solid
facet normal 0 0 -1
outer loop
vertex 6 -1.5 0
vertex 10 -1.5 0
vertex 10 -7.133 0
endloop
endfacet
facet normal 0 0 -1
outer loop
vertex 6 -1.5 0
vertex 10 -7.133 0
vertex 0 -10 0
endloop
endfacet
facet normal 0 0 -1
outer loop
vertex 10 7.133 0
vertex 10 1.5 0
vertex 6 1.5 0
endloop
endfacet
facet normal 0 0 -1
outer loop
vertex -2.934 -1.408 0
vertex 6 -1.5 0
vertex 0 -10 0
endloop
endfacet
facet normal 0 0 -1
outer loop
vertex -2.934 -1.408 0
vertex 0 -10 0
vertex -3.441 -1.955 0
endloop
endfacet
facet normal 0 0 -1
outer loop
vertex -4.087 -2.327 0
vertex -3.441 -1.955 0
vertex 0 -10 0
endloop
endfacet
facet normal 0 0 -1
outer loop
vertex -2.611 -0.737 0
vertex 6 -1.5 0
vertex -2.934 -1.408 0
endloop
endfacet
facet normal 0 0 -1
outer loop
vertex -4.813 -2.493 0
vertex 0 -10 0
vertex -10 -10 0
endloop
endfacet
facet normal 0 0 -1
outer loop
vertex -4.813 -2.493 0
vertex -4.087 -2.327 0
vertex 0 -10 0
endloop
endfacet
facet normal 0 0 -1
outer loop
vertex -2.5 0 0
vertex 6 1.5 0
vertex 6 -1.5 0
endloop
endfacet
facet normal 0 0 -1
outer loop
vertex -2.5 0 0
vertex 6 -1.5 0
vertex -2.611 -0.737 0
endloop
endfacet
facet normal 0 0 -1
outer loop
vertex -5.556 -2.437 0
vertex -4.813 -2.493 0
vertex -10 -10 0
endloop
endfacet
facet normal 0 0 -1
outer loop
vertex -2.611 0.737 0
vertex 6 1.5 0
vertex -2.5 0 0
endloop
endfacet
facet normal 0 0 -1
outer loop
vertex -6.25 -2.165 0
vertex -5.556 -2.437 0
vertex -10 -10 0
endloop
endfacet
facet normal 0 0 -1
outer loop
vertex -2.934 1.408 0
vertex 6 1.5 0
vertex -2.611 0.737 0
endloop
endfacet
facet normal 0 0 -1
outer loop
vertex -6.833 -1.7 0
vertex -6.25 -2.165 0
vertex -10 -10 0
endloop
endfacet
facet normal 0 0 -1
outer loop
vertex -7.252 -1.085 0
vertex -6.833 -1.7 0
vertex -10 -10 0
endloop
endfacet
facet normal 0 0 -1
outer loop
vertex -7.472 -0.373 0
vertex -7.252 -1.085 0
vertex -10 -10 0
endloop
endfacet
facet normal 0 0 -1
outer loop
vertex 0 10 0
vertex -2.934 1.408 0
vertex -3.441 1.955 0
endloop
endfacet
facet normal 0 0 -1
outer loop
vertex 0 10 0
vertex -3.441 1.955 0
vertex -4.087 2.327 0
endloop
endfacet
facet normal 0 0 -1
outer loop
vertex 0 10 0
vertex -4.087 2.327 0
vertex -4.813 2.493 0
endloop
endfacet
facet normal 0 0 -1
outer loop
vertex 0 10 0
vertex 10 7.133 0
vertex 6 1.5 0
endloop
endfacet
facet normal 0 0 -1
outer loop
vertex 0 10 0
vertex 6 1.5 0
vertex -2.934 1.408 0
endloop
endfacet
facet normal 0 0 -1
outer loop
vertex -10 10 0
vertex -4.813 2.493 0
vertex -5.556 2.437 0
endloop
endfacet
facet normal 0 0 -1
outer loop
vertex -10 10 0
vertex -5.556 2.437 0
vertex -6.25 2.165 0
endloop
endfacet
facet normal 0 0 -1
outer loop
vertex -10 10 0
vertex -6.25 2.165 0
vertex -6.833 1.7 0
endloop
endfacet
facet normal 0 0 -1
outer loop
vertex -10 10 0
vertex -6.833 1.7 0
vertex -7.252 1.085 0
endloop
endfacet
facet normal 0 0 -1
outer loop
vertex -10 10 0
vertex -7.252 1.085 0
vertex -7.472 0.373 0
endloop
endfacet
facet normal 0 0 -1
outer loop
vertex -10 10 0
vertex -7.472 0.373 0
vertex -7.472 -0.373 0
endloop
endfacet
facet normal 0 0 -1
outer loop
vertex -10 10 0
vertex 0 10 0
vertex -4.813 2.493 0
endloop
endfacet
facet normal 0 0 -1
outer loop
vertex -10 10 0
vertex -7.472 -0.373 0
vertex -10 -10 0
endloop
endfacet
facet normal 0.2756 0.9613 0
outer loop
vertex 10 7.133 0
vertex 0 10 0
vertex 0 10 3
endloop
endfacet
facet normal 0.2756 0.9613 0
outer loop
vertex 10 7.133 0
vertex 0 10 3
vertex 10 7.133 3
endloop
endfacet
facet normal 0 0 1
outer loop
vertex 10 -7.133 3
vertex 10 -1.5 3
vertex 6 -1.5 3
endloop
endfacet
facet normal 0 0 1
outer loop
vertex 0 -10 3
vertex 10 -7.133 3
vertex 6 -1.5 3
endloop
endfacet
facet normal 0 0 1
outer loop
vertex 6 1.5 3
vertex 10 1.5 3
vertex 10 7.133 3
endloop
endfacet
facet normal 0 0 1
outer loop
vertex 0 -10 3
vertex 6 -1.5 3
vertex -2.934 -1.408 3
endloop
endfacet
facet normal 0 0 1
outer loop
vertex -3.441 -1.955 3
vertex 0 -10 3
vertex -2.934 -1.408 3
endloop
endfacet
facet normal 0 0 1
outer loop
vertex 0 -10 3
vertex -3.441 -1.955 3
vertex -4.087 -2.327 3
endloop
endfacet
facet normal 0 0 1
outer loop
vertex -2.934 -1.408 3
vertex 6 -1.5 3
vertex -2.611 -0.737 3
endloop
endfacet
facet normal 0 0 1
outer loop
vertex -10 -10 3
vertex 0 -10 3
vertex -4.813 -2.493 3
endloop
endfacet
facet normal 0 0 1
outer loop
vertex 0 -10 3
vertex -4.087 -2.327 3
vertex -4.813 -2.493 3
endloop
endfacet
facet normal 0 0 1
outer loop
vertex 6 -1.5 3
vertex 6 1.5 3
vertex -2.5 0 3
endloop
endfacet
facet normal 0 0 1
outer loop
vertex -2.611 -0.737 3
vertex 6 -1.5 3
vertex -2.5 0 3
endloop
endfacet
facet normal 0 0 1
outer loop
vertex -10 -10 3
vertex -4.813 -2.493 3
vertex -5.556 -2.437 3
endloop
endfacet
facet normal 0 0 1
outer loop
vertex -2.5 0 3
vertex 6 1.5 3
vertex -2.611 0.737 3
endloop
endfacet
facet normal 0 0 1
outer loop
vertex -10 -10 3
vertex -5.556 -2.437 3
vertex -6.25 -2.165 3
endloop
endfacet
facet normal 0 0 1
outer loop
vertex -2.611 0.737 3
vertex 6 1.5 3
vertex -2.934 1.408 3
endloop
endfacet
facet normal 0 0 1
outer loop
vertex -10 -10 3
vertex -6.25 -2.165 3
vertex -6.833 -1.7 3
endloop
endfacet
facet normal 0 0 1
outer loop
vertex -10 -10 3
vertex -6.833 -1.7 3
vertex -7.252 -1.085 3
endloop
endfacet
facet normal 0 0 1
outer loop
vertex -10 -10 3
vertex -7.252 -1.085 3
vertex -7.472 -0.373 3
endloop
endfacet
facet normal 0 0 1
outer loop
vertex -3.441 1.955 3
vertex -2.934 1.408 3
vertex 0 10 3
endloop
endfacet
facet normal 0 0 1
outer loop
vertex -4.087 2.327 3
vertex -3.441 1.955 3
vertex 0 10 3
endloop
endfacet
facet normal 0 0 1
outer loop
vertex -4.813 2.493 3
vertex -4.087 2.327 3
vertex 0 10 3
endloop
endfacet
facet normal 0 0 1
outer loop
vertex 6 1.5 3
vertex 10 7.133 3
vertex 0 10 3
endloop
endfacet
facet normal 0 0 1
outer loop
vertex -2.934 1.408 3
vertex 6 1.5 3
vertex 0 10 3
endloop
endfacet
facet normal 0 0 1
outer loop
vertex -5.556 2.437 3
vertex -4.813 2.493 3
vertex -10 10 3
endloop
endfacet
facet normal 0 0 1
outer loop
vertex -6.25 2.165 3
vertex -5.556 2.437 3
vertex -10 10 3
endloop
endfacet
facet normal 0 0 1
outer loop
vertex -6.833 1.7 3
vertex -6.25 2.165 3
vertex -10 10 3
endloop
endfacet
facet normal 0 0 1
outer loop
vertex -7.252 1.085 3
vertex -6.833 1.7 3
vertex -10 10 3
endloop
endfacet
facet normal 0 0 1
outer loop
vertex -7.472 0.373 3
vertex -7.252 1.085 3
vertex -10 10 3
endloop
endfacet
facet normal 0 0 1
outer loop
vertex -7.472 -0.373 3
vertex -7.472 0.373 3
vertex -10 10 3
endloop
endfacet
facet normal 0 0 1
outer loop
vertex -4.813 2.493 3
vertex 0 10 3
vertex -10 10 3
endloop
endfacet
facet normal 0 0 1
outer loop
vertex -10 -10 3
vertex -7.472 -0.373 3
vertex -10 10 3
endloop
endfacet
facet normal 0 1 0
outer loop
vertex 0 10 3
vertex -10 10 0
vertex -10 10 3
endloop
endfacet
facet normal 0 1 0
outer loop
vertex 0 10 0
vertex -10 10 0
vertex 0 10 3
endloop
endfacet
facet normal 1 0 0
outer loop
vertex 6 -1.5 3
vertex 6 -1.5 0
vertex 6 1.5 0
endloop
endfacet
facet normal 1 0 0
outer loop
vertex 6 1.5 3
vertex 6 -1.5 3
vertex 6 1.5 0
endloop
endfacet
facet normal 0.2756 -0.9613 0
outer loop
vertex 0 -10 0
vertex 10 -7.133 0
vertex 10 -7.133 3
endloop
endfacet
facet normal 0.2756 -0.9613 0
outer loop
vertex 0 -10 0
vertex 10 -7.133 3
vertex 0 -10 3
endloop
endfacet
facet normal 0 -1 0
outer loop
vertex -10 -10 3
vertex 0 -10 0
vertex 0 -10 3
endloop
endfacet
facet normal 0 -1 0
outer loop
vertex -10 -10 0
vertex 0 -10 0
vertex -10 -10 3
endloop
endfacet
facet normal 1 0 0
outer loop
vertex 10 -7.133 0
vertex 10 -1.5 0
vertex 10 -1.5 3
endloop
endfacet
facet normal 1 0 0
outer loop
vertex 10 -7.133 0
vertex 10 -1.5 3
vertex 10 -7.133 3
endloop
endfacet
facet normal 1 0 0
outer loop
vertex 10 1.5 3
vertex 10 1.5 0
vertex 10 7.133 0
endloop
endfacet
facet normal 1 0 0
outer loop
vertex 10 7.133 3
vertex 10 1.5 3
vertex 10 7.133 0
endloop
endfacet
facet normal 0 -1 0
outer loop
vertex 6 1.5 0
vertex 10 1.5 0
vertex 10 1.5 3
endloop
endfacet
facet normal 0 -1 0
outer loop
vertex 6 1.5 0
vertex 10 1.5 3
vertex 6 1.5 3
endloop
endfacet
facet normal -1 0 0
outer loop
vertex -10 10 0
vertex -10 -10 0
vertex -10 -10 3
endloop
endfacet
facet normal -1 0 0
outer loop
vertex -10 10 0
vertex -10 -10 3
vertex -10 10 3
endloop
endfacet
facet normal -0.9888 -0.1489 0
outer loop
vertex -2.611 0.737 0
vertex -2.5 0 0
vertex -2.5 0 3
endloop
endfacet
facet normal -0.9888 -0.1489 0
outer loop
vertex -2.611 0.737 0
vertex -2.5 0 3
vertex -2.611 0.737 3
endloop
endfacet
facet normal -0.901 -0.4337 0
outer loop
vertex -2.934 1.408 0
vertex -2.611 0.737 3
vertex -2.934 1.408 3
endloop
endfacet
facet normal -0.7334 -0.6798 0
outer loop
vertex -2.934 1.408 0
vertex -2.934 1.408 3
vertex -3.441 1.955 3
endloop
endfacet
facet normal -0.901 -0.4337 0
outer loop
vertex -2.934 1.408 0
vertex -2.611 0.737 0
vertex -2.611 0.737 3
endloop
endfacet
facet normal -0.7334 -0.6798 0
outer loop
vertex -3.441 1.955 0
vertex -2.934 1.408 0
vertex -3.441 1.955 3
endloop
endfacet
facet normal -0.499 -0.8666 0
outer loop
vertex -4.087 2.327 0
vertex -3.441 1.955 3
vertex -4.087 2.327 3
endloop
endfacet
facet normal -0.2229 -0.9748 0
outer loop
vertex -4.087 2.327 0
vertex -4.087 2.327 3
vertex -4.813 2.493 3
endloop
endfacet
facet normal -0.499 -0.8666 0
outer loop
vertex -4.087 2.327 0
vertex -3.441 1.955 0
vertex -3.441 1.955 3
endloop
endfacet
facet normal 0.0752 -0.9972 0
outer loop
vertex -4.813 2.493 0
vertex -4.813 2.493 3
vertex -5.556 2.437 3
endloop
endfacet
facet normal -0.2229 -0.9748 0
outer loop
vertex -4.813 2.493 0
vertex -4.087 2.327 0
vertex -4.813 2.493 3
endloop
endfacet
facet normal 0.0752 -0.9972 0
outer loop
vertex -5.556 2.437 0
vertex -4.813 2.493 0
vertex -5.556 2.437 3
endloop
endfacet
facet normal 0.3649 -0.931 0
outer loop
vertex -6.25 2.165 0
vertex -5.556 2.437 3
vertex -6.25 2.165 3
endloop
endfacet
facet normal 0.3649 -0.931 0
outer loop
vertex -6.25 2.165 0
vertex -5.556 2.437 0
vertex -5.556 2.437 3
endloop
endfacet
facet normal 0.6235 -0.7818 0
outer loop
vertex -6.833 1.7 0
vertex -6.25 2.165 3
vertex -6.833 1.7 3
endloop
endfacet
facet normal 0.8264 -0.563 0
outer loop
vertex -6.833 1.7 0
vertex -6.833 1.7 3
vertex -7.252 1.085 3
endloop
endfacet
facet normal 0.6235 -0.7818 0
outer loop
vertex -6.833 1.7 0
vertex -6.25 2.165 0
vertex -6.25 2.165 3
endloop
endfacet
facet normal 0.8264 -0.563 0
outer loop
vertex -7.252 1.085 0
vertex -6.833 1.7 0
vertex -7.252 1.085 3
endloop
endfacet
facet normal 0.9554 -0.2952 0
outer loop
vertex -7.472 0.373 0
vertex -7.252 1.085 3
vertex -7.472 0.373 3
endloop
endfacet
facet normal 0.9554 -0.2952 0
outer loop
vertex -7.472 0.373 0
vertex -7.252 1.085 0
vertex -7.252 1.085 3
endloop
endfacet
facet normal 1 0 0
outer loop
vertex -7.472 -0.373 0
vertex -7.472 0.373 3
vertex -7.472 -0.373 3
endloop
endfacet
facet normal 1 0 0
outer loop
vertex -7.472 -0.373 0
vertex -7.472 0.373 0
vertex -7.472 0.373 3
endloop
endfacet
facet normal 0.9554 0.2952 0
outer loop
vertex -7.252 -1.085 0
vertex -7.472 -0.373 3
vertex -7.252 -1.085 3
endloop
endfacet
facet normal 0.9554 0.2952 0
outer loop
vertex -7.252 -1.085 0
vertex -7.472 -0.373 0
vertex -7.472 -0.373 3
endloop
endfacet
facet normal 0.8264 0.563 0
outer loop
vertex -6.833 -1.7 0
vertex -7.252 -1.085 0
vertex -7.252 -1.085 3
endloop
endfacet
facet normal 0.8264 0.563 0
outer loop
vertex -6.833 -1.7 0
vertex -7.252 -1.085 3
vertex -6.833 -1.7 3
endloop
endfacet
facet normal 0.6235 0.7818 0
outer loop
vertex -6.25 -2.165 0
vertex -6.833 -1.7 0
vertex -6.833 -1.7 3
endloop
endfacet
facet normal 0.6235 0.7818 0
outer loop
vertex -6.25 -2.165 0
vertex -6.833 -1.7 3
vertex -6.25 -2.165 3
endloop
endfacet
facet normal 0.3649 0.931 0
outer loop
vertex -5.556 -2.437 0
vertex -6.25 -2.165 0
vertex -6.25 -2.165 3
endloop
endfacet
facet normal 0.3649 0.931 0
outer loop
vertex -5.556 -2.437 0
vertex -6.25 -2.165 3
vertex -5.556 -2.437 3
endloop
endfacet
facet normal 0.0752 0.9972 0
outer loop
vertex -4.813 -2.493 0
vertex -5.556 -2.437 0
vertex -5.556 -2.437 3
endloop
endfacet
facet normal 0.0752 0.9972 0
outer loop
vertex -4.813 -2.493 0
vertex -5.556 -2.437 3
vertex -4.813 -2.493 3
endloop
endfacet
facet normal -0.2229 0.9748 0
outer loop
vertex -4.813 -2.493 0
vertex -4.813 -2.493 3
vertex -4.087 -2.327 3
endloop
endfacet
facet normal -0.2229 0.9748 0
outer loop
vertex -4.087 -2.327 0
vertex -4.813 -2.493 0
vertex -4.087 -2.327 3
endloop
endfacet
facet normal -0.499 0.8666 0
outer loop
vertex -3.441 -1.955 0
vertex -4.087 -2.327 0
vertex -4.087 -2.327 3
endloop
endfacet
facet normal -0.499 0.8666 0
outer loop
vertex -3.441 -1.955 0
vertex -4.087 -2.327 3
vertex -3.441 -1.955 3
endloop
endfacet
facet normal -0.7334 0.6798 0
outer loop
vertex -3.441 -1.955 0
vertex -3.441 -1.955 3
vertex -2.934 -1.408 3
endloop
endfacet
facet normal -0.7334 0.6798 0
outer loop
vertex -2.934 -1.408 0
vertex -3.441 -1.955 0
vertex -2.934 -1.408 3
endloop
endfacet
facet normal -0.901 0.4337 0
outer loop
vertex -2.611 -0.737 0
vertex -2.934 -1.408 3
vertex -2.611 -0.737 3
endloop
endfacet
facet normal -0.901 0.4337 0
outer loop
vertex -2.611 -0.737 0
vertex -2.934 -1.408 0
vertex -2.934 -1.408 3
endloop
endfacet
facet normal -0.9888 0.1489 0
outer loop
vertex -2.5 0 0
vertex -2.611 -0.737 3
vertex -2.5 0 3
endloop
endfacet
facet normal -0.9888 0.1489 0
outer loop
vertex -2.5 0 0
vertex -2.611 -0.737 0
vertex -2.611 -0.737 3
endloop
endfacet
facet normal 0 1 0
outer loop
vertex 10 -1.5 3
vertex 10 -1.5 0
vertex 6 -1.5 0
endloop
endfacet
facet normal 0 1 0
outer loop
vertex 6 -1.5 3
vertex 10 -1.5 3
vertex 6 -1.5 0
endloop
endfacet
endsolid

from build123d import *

# Parameters (mm, degrees)
SKETCH1_R           = 2.5
BOSS_EXTRUDE1_DEPTH = 3
SKETCH2_W           = 5
SKETCH2_H           = 1
BOSS_EXTRUDE2_DEPTH = 3
SKETCH3_W           = 1
SKETCH3_H           = 3
BOSS_EXTRUDE3_DEPTH = 3


with BuildPart() as part:
    # Sketch1 → Boss-Extrude1 (new body)
    with BuildSketch(Plane.XY):
        Polygon((0, 10), (10, 7.132546142), (10, 2.5), (5, 2.5), (5, -2.5), (10, -2.5), (10, -7.132546142), (0, -10), (-10, -10), (-10, 10), align=None)
        with Locations((-5, 0)):
            Circle(SKETCH1_R, mode=Mode.SUBTRACT)
    extrude(amount=BOSS_EXTRUDE1_DEPTH)

    # Sketch2 → Boss-Extrude2 (add)
    with BuildSketch(Plane(origin=(0, 0, 0), x_dir=(-1, 0, 0), z_dir=(0, 0, -1))):
        with Locations((-7.5, 2)):
            Rectangle(SKETCH2_W, SKETCH2_H)
        with Locations((-7.5, -2)):
            Rectangle(SKETCH2_W, SKETCH2_H)
    extrude(amount=-BOSS_EXTRUDE2_DEPTH)

    # Sketch3 → Boss-Extrude3 (add)
    with BuildSketch(Plane(origin=(0, 0, 0), x_dir=(-1, 0, 0), z_dir=(0, 0, -1))):
        with Locations((-5.5, 0)):
            Rectangle(SKETCH3_W, SKETCH3_H)
    extrude(amount=-BOSS_EXTRUDE3_DEPTH)


solid = part.part
